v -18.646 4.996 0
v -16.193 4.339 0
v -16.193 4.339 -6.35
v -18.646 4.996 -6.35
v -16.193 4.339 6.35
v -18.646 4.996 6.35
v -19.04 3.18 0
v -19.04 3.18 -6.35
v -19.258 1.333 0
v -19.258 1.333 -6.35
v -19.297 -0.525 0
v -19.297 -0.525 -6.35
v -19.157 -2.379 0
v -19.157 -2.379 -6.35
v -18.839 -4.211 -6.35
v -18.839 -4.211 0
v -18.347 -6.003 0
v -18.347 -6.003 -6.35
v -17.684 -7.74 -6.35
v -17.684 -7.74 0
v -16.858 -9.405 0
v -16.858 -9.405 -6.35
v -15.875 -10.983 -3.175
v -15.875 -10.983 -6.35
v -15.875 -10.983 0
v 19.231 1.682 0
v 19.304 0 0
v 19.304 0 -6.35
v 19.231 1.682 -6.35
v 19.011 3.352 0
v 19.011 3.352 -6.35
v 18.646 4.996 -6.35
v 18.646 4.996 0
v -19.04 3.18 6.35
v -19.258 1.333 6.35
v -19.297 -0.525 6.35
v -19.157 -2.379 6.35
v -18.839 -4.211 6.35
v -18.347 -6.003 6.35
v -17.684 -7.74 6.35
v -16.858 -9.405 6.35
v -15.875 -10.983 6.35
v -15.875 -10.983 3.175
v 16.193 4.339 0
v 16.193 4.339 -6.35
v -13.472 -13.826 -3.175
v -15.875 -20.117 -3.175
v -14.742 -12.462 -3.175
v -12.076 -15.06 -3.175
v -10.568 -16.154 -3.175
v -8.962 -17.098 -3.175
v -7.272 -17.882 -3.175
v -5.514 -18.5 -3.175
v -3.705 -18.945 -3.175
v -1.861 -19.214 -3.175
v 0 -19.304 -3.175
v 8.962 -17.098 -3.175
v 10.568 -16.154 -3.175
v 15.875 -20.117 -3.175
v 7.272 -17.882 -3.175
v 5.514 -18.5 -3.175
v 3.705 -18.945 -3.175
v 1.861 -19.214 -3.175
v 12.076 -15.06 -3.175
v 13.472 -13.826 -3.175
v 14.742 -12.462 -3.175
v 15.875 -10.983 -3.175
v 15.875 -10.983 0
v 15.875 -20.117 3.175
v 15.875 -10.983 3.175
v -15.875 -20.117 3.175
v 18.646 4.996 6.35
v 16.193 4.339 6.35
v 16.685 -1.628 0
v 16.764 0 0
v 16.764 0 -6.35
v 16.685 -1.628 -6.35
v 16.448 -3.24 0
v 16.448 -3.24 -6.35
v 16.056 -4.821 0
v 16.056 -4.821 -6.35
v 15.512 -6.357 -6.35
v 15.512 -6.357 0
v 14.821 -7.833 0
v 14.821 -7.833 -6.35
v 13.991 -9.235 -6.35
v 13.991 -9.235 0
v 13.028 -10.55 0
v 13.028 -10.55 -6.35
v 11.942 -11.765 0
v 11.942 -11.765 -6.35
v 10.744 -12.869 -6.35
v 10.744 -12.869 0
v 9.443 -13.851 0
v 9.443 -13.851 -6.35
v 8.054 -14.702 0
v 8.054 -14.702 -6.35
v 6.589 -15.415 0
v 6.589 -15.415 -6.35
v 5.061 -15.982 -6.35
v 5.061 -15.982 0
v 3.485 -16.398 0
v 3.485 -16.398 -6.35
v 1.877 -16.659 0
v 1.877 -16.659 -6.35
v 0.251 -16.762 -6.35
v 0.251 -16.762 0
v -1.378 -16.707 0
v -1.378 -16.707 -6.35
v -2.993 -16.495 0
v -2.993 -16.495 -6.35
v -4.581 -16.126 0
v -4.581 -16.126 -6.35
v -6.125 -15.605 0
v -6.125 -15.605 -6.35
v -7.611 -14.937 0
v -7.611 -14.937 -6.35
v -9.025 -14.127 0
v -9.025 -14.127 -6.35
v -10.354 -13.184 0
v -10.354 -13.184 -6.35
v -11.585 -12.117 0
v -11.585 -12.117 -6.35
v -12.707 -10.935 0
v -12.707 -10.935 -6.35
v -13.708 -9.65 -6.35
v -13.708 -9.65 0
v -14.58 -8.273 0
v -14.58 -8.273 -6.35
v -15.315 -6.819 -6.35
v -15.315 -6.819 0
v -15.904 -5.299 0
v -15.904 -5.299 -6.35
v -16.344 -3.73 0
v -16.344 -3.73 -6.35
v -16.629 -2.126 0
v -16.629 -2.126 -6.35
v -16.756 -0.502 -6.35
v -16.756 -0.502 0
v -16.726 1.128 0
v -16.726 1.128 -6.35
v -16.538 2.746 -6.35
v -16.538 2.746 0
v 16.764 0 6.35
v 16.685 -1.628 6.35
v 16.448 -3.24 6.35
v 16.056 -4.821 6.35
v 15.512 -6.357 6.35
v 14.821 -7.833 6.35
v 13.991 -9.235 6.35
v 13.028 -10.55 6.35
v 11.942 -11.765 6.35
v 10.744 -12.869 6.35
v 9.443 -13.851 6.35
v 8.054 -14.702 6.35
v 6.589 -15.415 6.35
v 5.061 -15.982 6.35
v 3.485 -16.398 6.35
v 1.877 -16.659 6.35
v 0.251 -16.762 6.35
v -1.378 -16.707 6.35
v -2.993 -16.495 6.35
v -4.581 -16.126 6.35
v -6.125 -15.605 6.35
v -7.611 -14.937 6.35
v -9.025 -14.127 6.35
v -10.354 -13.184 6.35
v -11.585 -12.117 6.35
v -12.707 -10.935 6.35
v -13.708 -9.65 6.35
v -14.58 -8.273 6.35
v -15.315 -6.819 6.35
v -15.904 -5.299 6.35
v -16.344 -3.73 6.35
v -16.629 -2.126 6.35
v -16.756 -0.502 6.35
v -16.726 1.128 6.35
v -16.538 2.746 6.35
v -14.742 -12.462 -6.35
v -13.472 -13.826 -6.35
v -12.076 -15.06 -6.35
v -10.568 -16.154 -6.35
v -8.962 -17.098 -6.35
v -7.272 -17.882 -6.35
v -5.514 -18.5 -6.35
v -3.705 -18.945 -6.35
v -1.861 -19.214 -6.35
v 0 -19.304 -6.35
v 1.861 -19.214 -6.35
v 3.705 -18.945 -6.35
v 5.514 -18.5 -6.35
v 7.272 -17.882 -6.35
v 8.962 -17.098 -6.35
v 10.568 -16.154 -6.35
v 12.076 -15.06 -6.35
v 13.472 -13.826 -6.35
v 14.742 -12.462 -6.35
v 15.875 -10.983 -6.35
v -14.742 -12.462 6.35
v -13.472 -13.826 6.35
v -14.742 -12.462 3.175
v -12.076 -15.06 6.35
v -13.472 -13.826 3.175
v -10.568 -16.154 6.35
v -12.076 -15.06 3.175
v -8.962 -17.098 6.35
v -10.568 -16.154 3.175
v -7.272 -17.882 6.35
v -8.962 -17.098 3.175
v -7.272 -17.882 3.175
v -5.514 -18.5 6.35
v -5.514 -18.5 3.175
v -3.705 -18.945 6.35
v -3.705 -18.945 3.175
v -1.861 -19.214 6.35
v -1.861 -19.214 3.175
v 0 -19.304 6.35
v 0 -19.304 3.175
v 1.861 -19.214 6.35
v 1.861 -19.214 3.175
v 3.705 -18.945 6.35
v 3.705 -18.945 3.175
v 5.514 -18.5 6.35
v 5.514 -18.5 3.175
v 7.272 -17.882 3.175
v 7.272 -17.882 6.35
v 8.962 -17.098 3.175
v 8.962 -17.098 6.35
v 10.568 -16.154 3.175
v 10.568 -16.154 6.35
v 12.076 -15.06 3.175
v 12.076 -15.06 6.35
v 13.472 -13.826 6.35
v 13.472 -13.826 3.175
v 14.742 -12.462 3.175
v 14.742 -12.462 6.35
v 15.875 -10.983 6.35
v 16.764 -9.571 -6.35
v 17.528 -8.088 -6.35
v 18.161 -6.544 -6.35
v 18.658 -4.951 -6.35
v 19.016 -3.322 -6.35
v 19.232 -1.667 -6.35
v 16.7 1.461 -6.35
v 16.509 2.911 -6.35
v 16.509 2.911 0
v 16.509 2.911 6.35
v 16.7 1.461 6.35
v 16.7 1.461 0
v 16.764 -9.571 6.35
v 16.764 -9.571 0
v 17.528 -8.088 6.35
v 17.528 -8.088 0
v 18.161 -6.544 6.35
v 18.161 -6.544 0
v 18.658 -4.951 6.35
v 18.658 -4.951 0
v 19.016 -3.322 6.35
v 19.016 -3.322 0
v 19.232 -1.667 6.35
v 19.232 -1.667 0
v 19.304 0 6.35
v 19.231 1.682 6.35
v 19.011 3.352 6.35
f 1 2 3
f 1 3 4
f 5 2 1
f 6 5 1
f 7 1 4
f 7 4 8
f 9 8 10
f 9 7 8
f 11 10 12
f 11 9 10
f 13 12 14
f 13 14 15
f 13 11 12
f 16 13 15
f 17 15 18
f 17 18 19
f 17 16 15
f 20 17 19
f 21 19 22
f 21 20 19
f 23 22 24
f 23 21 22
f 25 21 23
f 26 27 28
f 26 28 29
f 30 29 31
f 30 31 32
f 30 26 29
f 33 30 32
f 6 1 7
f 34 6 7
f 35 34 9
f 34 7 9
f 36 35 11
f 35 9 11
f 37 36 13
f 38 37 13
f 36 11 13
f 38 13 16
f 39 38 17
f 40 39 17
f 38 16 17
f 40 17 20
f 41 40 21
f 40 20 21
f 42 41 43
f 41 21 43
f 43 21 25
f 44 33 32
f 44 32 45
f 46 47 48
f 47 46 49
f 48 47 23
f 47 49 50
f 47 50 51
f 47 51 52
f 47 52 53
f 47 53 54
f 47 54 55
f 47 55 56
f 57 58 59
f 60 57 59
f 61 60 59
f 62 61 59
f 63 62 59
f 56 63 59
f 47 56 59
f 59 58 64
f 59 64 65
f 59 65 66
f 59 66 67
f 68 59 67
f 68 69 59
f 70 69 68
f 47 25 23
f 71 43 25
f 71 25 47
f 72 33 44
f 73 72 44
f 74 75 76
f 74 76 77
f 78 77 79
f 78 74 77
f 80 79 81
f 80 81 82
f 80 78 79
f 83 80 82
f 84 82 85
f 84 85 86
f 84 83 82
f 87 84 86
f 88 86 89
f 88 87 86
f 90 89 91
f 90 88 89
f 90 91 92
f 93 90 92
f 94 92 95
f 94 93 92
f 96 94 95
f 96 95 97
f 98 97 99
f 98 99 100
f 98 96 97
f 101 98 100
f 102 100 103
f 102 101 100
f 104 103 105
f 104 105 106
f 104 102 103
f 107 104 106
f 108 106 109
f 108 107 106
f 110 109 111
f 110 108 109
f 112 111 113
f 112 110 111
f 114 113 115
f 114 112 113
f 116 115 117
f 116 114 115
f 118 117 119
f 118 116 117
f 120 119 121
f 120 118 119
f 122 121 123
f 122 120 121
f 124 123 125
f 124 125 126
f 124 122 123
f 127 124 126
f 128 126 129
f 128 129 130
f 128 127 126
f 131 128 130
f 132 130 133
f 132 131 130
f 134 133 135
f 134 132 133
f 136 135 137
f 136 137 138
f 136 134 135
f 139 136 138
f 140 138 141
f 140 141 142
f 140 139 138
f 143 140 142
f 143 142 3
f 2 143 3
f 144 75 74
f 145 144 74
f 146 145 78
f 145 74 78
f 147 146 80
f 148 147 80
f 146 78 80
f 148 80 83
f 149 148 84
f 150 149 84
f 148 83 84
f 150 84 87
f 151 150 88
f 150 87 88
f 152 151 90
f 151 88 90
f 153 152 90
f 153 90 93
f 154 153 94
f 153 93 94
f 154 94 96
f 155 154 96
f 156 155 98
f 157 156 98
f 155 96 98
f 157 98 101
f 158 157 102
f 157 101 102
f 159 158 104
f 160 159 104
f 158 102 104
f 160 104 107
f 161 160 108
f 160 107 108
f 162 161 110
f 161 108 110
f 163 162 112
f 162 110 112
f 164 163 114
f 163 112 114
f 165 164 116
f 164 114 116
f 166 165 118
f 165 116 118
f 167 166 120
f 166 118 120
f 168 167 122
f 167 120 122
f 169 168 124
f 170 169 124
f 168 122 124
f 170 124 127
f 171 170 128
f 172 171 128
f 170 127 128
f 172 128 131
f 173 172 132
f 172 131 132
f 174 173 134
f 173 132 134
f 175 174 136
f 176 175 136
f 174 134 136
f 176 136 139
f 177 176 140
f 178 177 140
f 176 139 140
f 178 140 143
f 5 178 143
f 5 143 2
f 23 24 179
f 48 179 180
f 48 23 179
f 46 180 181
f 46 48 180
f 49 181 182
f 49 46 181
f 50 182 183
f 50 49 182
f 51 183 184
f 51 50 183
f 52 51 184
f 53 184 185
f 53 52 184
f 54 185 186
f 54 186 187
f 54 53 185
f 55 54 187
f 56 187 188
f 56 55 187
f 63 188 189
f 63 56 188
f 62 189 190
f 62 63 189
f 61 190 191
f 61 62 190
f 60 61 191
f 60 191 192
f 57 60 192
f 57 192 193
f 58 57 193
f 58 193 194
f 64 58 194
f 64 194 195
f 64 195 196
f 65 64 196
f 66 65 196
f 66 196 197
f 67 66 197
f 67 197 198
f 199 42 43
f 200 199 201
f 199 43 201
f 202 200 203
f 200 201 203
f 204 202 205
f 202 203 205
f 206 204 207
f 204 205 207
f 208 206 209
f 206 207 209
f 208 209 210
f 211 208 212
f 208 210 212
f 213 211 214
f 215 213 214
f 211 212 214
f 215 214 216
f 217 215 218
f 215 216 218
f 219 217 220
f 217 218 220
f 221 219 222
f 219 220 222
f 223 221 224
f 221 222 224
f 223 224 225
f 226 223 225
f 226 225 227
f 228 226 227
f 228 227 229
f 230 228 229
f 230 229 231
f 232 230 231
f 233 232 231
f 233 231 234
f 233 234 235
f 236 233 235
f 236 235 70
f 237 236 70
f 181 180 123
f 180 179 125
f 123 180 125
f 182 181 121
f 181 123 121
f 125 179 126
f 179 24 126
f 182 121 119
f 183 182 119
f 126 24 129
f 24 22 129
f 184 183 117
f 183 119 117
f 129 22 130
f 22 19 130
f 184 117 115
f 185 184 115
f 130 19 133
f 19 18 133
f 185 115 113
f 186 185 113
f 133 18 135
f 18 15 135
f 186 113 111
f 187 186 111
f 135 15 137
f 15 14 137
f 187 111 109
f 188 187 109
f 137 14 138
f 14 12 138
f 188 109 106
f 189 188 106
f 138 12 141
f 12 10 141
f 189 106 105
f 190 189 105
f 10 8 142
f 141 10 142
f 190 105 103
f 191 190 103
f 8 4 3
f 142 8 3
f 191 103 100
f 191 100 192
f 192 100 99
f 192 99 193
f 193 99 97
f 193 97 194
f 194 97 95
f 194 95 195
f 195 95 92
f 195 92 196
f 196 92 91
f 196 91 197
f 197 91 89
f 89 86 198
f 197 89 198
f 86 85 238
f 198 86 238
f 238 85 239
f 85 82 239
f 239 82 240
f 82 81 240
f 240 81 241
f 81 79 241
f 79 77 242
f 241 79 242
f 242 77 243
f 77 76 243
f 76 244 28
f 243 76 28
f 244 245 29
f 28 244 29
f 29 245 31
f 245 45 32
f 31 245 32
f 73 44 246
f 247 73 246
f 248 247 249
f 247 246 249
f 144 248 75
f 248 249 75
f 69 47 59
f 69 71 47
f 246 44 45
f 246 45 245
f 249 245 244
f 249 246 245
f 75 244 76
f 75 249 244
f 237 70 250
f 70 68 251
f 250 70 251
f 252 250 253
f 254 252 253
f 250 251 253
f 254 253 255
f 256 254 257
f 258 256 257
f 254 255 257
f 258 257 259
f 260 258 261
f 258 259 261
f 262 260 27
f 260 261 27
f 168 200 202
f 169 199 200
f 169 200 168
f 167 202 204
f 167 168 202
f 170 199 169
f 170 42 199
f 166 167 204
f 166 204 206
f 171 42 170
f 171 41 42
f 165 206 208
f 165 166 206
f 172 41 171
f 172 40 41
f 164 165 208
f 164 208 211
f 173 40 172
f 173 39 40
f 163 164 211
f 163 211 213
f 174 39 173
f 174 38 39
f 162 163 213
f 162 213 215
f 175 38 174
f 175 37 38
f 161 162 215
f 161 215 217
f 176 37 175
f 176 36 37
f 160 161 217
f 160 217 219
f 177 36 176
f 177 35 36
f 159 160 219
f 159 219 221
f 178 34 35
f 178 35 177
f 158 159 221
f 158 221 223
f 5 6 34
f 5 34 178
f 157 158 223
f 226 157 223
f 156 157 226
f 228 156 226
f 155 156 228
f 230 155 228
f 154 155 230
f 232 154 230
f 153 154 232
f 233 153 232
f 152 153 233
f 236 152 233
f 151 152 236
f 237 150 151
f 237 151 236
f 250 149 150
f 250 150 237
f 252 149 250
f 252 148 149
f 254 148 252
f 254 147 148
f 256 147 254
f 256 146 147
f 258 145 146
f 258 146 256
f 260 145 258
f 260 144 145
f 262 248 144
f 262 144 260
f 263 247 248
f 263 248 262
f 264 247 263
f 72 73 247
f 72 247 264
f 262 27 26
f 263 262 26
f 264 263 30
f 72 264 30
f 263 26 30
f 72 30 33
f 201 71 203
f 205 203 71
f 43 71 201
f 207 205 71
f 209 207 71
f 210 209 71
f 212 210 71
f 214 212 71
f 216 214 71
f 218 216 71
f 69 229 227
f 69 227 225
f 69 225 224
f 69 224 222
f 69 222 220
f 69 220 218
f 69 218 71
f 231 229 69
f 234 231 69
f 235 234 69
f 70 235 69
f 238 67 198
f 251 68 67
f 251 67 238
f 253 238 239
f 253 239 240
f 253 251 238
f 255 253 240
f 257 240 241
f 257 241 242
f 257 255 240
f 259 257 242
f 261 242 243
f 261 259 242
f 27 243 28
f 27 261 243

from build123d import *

# Parameters (mm, degrees)
F1_DEPTH = 6.35
F2_DEPTH = 3.175


with BuildPart() as f1:
    # F0 (on Top) → F1 (new body, symmetric)
    with BuildSketch(Plane.XY):
        with BuildLine():
            ThreePointArc((15.875, -10.9831139027), (18.4268203443, -5.7529738397), (19.304, 0))
            ThreePointArc((19.304, 0), (19.138851604, 2.5196776146), (18.6462321507, 4.9962428467))
            Line((18.6462321507, 4.9962428467), (16.1927805519, 4.3388424721))
            ThreePointArc((16.1927805519, 4.3388424721), (16.6205816561, 2.1881410864), (16.764, 0))
            ThreePointArc((16.764, 0), (-2.1881410864, -16.6205816561), (-16.1927805519, 4.3388424721))
            Line((-16.1927805519, 4.3388424721), (-18.6462321507, 4.9962428467))
            ThreePointArc((-18.6462321507, 4.9962428467), (-19.020090111, -3.2985736567), (-15.875, -10.9831139027))
            ThreePointArc((-15.875, -10.9831139027), (0, -19.304), (15.875, -10.9831139027))
        make_face()
    extrude(amount=F1_DEPTH, both=True)

    # F0 (on Top) → F2 (join, symmetric)
    with BuildSketch(Plane.XY):
        with BuildLine():
            Line((15.875, -20.1168), (15.875, -10.9831139027))
            ThreePointArc((15.875, -10.9831139027), (0, -19.304), (-15.875, -10.9831139027))
            Line((-15.875, -10.9831139027), (-15.875, -20.1168))
            Line((-15.875, -20.1168), (15.875, -20.1168))
        make_face()
    extrude(amount=F2_DEPTH, both=True)


solid = f1.part
